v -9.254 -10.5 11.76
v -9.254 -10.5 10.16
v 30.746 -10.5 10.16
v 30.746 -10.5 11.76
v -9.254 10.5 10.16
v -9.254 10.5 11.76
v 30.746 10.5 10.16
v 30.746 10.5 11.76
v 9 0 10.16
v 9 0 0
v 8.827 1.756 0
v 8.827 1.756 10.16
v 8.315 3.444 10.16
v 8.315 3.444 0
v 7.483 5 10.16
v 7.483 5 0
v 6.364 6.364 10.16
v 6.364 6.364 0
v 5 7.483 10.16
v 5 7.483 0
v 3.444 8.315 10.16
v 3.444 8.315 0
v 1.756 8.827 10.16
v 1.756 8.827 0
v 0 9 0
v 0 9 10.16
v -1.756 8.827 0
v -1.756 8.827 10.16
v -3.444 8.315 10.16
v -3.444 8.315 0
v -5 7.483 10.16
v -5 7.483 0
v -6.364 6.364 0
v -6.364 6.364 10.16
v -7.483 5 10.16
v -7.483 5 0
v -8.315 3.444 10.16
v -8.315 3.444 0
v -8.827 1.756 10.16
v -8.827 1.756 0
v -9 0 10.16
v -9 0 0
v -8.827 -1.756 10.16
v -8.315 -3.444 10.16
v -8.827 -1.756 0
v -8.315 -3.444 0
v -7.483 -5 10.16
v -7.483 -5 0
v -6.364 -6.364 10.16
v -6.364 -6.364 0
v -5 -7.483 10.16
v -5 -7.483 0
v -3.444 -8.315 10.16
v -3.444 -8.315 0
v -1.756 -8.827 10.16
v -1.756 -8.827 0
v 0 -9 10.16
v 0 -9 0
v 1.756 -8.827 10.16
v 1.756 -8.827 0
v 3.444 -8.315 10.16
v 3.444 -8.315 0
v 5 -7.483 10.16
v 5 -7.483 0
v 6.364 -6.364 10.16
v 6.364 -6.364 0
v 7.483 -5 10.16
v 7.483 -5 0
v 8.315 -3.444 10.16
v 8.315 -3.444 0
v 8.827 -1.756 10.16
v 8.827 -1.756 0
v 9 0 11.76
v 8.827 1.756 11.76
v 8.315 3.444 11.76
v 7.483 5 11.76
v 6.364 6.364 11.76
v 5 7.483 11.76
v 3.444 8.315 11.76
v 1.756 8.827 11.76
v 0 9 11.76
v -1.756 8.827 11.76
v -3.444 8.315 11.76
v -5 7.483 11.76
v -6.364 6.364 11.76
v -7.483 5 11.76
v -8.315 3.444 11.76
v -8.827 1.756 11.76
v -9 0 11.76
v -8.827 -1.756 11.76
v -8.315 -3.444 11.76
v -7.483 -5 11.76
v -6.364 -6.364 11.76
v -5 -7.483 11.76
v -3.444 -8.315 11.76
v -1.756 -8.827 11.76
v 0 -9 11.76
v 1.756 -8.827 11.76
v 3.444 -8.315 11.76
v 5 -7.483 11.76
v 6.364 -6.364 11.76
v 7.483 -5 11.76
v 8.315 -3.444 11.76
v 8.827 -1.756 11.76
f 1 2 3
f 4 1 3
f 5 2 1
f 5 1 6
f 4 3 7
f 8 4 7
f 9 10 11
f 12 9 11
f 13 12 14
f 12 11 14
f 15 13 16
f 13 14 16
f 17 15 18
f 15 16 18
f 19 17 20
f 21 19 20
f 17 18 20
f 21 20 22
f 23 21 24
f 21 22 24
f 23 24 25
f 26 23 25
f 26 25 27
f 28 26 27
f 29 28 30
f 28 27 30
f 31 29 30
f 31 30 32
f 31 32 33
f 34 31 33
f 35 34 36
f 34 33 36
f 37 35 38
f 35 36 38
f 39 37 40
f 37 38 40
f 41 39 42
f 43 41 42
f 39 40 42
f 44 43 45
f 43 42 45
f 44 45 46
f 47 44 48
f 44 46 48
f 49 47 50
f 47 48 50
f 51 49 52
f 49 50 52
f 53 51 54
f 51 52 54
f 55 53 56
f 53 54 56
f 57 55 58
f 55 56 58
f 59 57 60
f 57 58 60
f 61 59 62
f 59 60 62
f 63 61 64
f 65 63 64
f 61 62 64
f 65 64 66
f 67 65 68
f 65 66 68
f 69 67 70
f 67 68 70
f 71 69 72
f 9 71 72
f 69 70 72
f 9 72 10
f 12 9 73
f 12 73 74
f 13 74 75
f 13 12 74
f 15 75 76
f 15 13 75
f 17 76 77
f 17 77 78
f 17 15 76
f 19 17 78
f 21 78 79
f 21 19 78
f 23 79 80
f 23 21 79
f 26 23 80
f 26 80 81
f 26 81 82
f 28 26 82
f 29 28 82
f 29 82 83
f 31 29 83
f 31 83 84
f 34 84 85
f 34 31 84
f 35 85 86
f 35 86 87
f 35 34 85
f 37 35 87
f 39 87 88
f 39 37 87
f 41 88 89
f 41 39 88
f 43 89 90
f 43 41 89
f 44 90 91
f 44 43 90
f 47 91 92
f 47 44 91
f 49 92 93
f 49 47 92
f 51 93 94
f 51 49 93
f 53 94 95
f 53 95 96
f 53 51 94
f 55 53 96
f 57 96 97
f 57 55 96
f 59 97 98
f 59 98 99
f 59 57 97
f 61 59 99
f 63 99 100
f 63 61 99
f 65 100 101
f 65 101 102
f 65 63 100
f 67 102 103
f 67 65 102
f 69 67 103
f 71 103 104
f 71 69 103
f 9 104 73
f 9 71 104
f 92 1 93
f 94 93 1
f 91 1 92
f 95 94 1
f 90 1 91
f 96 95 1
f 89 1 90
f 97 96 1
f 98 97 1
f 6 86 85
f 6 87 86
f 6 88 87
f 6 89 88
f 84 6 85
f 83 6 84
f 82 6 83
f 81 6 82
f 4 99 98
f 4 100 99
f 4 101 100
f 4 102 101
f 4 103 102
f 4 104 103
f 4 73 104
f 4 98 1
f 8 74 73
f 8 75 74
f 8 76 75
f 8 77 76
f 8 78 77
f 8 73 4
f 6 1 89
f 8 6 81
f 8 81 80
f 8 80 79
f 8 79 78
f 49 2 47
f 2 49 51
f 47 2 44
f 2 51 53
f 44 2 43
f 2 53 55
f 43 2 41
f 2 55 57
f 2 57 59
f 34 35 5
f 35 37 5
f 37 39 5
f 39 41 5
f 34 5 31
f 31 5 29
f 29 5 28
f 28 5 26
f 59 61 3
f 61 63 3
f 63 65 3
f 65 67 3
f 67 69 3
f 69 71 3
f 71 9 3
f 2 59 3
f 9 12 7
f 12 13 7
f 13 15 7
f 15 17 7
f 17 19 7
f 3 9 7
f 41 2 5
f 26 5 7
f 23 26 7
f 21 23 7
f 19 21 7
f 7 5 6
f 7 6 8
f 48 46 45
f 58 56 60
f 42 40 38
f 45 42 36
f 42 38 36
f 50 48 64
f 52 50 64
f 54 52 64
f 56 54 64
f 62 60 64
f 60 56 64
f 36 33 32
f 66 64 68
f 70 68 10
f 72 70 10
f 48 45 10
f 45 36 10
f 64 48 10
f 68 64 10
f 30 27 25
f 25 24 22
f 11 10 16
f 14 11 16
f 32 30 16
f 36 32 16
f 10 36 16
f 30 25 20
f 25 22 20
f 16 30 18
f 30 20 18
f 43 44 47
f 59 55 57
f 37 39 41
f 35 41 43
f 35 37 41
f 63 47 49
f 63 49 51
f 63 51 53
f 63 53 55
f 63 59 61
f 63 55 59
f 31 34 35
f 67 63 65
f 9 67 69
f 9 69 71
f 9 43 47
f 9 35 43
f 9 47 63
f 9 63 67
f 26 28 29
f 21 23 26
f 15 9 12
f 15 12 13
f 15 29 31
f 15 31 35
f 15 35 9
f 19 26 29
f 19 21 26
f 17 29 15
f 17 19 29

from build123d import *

# Parameters (mm, degrees)
F0_R     = 9
F1_DEPTH = 10.16
F2_W     = 40
F2_H     = 21
F2_R     = 9
F3_DEPTH = 1.6


with BuildPart() as f1:
    # F0 (on Top) → F1 (new body)
    with BuildSketch(Plane.XY):
        Circle(F0_R)
    extrude(amount=F1_DEPTH)


with BuildPart() as f3:
    # F2 (on face) → F3 (new body)
    with BuildSketch(Plane.XY.offset(10.16)):
        with Locations((10.746, 0)):
            Rectangle(F2_W, F2_H)
        Circle(F2_R, mode=Mode.SUBTRACT)
    extrude(amount=F3_DEPTH)


solid = Compound([f1.part, f3.part])
